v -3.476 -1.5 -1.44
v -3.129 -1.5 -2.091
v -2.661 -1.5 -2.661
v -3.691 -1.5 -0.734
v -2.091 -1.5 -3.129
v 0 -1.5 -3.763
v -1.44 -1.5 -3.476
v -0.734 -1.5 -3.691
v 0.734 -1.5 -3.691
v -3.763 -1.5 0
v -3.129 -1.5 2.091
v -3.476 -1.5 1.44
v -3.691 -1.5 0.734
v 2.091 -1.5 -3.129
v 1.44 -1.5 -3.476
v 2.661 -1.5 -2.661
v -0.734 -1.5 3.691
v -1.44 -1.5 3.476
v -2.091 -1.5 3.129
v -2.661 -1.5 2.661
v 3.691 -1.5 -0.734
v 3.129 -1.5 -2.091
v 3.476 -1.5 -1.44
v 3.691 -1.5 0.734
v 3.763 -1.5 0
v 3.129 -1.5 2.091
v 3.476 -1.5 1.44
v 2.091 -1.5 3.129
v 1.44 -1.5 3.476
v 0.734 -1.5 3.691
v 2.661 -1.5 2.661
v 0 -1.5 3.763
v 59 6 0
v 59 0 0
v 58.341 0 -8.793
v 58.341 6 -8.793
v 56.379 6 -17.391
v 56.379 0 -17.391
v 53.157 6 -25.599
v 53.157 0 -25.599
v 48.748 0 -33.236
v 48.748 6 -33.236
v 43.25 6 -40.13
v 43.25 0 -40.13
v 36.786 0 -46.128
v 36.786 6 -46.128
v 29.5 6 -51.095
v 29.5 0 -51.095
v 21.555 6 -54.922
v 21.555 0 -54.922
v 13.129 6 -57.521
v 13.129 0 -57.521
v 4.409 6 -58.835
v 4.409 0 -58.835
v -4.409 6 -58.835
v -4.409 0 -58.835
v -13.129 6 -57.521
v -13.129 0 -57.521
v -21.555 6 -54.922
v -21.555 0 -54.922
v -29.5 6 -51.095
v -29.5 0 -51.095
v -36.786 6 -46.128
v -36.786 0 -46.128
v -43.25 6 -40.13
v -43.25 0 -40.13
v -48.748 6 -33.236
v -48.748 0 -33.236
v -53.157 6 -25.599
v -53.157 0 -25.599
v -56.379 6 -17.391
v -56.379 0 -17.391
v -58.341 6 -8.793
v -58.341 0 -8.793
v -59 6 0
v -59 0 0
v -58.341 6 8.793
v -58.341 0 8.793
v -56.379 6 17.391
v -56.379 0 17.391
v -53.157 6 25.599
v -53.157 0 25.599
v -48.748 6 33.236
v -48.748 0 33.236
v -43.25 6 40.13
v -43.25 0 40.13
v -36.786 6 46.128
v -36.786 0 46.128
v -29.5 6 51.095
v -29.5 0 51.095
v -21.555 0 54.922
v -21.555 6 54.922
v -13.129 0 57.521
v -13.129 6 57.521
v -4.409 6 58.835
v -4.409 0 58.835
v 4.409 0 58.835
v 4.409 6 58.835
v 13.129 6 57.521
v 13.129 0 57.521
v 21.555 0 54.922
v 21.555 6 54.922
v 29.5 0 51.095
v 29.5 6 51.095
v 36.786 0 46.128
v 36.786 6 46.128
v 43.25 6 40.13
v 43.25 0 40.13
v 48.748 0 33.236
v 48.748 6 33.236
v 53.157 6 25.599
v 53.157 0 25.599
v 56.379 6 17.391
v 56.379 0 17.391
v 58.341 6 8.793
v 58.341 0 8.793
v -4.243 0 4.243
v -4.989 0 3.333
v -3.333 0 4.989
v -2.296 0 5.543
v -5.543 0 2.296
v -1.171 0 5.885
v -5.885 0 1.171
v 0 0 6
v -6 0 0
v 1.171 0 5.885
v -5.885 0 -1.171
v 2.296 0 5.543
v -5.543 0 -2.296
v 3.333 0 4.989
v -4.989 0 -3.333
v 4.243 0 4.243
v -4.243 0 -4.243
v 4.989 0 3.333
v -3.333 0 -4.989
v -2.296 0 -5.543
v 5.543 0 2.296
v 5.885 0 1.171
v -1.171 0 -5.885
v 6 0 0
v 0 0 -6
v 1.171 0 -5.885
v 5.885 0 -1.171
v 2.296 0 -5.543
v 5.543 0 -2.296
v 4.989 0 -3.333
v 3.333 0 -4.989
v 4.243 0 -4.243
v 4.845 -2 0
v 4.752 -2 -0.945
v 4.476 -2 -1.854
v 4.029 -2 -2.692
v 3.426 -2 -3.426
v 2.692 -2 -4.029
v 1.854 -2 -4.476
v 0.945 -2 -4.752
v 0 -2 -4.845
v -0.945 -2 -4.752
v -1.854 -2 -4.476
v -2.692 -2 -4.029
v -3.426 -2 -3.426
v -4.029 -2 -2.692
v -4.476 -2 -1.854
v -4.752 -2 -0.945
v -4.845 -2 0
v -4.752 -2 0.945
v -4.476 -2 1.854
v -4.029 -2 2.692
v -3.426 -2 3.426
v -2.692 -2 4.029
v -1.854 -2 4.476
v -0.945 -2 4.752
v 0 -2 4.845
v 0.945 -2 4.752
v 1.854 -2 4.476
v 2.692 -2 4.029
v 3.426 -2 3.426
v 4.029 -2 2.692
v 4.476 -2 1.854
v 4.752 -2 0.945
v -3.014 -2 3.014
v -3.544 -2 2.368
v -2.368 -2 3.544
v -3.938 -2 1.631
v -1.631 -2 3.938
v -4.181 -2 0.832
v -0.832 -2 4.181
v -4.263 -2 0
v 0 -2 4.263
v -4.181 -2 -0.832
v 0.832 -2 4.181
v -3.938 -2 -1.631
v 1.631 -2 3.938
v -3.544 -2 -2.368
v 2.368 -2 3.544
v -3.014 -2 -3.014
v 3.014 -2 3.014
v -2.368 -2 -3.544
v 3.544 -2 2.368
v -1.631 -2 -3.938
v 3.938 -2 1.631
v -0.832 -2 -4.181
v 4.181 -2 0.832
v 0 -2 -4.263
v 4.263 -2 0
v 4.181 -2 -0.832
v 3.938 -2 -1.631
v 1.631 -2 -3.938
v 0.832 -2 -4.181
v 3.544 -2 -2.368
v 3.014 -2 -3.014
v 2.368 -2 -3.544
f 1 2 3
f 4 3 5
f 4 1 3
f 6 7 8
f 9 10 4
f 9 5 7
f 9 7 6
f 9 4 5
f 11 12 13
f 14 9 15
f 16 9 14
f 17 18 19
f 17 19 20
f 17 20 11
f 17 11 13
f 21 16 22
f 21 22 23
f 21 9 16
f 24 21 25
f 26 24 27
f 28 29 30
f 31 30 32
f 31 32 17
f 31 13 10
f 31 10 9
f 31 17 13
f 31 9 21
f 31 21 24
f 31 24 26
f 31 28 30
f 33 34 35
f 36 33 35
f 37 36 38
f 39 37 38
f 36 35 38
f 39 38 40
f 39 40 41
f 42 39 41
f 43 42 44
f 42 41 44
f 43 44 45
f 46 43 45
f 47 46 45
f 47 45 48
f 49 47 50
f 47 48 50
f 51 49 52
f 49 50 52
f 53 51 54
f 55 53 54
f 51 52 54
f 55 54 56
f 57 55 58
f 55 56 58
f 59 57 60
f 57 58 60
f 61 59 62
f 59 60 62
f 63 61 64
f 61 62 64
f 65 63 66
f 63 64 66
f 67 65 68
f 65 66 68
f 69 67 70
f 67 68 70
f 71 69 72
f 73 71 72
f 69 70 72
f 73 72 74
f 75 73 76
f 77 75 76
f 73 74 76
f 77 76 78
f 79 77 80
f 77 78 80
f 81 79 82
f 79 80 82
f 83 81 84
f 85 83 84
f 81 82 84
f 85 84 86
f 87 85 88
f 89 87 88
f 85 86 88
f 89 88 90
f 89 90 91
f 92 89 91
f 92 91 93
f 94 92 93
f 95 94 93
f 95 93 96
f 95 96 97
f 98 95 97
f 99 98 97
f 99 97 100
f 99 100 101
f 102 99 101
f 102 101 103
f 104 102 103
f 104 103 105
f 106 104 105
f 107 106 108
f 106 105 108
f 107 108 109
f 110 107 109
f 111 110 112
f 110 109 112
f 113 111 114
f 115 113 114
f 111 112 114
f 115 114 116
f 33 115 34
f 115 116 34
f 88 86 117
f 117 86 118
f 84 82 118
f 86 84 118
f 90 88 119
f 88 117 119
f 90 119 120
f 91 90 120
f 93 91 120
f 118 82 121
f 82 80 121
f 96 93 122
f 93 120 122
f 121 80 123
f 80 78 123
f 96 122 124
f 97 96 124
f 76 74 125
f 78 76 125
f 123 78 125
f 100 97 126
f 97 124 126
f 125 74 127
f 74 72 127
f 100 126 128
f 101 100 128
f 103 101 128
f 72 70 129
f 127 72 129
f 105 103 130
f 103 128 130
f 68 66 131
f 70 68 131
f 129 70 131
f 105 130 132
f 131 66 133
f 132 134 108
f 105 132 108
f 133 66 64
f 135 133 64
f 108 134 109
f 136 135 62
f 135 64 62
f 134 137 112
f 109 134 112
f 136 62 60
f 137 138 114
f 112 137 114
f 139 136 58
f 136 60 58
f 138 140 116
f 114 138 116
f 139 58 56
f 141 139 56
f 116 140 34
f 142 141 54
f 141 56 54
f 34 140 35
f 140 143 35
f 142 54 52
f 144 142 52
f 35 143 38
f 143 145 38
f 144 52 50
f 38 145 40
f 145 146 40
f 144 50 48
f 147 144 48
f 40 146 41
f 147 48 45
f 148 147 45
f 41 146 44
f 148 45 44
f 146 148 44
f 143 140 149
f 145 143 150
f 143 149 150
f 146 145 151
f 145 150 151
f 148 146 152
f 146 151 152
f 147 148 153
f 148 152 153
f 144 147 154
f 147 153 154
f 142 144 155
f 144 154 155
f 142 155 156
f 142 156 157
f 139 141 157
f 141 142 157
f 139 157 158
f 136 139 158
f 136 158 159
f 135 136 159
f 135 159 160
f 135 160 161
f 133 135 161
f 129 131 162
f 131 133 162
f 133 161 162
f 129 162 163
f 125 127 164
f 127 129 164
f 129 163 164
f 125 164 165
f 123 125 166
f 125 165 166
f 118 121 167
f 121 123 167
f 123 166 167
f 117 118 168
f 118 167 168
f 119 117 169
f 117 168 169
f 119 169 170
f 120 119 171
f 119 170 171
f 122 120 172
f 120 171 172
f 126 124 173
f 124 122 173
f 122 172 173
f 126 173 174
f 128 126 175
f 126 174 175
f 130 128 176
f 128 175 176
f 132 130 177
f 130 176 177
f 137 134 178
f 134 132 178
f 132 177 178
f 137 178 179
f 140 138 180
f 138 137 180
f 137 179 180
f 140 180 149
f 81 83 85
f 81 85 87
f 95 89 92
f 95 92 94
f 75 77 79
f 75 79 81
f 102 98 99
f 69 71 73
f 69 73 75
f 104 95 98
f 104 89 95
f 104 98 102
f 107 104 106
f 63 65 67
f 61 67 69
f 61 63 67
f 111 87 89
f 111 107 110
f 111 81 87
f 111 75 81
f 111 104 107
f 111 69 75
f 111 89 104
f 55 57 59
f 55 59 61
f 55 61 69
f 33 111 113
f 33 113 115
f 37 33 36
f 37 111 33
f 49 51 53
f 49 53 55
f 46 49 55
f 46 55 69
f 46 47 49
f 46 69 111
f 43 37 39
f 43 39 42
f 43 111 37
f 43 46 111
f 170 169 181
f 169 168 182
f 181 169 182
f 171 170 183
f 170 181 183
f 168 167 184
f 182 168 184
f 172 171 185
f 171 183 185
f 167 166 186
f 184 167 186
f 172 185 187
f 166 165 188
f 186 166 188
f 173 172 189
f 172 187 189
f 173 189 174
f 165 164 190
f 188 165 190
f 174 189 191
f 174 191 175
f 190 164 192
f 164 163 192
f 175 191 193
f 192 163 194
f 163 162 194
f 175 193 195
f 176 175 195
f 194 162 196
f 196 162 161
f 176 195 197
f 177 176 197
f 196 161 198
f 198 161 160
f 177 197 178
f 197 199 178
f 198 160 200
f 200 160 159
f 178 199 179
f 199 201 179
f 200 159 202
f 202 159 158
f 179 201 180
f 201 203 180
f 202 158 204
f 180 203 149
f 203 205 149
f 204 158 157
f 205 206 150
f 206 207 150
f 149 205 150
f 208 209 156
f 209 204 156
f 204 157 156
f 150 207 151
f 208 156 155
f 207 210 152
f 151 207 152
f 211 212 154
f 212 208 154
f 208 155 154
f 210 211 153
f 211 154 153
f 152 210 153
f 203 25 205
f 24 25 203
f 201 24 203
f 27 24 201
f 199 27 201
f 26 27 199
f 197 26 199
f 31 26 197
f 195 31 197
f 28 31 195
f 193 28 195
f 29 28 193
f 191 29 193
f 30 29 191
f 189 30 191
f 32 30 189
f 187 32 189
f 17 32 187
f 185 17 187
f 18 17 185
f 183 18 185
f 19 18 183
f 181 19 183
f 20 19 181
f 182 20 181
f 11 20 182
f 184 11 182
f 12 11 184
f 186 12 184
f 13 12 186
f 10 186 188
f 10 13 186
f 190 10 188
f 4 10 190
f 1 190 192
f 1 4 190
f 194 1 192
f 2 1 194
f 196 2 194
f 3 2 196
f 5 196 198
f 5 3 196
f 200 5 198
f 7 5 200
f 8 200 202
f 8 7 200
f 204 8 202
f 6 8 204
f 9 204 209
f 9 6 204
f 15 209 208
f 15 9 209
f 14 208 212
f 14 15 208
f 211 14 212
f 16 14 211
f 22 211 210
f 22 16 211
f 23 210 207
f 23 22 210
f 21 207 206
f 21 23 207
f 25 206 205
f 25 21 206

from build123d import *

# Parameters (mm, degrees)
SKIZZE1_R                       = 59
AUFSATZ_LINEAR_AUSTRAGEN1_DEPTH = 6
SKIZZE1_3_R                     = 6
AUFSATZ_LINEAR_AUSTRAGEN2_DEPTH = 2
AUFSATZ_LINEAR_AUSTRAGEN2_DRAFT = -30
SKIZZE2_R                       = 4.262826076
SCHNITT_LINEAR_AUSTRAGEN1_DEPTH = 0.5
SCHNITT_LINEAR_AUSTRAGEN1_DRAFT = -45


with BuildPart() as part:
    # Skizze1 → Aufsatz-Linear austragen1 (new body)
    with BuildSketch(Plane(origin=(0, 0, 0), x_dir=(1, 0, 0), z_dir=(0, 1, 0))):
        Circle(SKIZZE1_R)
    extrude(amount=AUFSATZ_LINEAR_AUSTRAGEN1_DEPTH)


with BuildPart() as aufsatz_linear_austragen2_tool:
    # Skizze1<3> → Aufsatz-Linear austragen2 (with draft: the straight prism first)
    with BuildSketch(Plane(origin=(0, 0, 0), x_dir=(1, 0, 0), z_dir=(0, 1, 0))):
        Circle(SKIZZE1_3_R)
    extrude(amount=-AUFSATZ_LINEAR_AUSTRAGEN2_DEPTH)
    # Aufsatz-Linear austragen2: the draft: its side faces are tilted about the plane it starts from
    aufsatz_linear_austragen2_sides = [aufsatz_linear_austragen2_tool.faces().sort_by_distance(p)[0] for p in [
        (-6, -1, 0),
    ]]
    draft(aufsatz_linear_austragen2_sides, Plane(origin=(0, 0, 0), x_dir=(1, 0, 0), z_dir=(0, 1, 0)), AUFSATZ_LINEAR_AUSTRAGEN2_DRAFT)


with BuildPart() as part_1:
    add(part.part)

    # Aufsatz-Linear austragen2: add aufsatz_linear_austragen2_tool
    add(aufsatz_linear_austragen2_tool.part)


with BuildPart() as schnitt_linear_austragen1_tool:
    # Skizze2 → Schnitt-Linear austragen1 (with draft: the straight prism first)
    with BuildSketch(Plane.XZ.offset(2)):
        Circle(SKIZZE2_R)
    extrude(amount=-SCHNITT_LINEAR_AUSTRAGEN1_DEPTH)
    # Schnitt-Linear austragen1: the draft: its side faces are tilted about the plane it starts from
    schnitt_linear_austragen1_sides = [schnitt_linear_austragen1_tool.faces().sort_by_distance(p)[0] for p in [
        (-4.262826076, -1.75, 0),
    ]]
    draft(schnitt_linear_austragen1_sides, Plane.XZ.offset(2), SCHNITT_LINEAR_AUSTRAGEN1_DRAFT)


with BuildPart() as part_2:
    add(part_1.part)

    # Schnitt-Linear austragen1: cut by schnitt_linear_austragen1_tool
    add(schnitt_linear_austragen1_tool.part, mode=Mode.SUBTRACT)


solid = part_2.part
